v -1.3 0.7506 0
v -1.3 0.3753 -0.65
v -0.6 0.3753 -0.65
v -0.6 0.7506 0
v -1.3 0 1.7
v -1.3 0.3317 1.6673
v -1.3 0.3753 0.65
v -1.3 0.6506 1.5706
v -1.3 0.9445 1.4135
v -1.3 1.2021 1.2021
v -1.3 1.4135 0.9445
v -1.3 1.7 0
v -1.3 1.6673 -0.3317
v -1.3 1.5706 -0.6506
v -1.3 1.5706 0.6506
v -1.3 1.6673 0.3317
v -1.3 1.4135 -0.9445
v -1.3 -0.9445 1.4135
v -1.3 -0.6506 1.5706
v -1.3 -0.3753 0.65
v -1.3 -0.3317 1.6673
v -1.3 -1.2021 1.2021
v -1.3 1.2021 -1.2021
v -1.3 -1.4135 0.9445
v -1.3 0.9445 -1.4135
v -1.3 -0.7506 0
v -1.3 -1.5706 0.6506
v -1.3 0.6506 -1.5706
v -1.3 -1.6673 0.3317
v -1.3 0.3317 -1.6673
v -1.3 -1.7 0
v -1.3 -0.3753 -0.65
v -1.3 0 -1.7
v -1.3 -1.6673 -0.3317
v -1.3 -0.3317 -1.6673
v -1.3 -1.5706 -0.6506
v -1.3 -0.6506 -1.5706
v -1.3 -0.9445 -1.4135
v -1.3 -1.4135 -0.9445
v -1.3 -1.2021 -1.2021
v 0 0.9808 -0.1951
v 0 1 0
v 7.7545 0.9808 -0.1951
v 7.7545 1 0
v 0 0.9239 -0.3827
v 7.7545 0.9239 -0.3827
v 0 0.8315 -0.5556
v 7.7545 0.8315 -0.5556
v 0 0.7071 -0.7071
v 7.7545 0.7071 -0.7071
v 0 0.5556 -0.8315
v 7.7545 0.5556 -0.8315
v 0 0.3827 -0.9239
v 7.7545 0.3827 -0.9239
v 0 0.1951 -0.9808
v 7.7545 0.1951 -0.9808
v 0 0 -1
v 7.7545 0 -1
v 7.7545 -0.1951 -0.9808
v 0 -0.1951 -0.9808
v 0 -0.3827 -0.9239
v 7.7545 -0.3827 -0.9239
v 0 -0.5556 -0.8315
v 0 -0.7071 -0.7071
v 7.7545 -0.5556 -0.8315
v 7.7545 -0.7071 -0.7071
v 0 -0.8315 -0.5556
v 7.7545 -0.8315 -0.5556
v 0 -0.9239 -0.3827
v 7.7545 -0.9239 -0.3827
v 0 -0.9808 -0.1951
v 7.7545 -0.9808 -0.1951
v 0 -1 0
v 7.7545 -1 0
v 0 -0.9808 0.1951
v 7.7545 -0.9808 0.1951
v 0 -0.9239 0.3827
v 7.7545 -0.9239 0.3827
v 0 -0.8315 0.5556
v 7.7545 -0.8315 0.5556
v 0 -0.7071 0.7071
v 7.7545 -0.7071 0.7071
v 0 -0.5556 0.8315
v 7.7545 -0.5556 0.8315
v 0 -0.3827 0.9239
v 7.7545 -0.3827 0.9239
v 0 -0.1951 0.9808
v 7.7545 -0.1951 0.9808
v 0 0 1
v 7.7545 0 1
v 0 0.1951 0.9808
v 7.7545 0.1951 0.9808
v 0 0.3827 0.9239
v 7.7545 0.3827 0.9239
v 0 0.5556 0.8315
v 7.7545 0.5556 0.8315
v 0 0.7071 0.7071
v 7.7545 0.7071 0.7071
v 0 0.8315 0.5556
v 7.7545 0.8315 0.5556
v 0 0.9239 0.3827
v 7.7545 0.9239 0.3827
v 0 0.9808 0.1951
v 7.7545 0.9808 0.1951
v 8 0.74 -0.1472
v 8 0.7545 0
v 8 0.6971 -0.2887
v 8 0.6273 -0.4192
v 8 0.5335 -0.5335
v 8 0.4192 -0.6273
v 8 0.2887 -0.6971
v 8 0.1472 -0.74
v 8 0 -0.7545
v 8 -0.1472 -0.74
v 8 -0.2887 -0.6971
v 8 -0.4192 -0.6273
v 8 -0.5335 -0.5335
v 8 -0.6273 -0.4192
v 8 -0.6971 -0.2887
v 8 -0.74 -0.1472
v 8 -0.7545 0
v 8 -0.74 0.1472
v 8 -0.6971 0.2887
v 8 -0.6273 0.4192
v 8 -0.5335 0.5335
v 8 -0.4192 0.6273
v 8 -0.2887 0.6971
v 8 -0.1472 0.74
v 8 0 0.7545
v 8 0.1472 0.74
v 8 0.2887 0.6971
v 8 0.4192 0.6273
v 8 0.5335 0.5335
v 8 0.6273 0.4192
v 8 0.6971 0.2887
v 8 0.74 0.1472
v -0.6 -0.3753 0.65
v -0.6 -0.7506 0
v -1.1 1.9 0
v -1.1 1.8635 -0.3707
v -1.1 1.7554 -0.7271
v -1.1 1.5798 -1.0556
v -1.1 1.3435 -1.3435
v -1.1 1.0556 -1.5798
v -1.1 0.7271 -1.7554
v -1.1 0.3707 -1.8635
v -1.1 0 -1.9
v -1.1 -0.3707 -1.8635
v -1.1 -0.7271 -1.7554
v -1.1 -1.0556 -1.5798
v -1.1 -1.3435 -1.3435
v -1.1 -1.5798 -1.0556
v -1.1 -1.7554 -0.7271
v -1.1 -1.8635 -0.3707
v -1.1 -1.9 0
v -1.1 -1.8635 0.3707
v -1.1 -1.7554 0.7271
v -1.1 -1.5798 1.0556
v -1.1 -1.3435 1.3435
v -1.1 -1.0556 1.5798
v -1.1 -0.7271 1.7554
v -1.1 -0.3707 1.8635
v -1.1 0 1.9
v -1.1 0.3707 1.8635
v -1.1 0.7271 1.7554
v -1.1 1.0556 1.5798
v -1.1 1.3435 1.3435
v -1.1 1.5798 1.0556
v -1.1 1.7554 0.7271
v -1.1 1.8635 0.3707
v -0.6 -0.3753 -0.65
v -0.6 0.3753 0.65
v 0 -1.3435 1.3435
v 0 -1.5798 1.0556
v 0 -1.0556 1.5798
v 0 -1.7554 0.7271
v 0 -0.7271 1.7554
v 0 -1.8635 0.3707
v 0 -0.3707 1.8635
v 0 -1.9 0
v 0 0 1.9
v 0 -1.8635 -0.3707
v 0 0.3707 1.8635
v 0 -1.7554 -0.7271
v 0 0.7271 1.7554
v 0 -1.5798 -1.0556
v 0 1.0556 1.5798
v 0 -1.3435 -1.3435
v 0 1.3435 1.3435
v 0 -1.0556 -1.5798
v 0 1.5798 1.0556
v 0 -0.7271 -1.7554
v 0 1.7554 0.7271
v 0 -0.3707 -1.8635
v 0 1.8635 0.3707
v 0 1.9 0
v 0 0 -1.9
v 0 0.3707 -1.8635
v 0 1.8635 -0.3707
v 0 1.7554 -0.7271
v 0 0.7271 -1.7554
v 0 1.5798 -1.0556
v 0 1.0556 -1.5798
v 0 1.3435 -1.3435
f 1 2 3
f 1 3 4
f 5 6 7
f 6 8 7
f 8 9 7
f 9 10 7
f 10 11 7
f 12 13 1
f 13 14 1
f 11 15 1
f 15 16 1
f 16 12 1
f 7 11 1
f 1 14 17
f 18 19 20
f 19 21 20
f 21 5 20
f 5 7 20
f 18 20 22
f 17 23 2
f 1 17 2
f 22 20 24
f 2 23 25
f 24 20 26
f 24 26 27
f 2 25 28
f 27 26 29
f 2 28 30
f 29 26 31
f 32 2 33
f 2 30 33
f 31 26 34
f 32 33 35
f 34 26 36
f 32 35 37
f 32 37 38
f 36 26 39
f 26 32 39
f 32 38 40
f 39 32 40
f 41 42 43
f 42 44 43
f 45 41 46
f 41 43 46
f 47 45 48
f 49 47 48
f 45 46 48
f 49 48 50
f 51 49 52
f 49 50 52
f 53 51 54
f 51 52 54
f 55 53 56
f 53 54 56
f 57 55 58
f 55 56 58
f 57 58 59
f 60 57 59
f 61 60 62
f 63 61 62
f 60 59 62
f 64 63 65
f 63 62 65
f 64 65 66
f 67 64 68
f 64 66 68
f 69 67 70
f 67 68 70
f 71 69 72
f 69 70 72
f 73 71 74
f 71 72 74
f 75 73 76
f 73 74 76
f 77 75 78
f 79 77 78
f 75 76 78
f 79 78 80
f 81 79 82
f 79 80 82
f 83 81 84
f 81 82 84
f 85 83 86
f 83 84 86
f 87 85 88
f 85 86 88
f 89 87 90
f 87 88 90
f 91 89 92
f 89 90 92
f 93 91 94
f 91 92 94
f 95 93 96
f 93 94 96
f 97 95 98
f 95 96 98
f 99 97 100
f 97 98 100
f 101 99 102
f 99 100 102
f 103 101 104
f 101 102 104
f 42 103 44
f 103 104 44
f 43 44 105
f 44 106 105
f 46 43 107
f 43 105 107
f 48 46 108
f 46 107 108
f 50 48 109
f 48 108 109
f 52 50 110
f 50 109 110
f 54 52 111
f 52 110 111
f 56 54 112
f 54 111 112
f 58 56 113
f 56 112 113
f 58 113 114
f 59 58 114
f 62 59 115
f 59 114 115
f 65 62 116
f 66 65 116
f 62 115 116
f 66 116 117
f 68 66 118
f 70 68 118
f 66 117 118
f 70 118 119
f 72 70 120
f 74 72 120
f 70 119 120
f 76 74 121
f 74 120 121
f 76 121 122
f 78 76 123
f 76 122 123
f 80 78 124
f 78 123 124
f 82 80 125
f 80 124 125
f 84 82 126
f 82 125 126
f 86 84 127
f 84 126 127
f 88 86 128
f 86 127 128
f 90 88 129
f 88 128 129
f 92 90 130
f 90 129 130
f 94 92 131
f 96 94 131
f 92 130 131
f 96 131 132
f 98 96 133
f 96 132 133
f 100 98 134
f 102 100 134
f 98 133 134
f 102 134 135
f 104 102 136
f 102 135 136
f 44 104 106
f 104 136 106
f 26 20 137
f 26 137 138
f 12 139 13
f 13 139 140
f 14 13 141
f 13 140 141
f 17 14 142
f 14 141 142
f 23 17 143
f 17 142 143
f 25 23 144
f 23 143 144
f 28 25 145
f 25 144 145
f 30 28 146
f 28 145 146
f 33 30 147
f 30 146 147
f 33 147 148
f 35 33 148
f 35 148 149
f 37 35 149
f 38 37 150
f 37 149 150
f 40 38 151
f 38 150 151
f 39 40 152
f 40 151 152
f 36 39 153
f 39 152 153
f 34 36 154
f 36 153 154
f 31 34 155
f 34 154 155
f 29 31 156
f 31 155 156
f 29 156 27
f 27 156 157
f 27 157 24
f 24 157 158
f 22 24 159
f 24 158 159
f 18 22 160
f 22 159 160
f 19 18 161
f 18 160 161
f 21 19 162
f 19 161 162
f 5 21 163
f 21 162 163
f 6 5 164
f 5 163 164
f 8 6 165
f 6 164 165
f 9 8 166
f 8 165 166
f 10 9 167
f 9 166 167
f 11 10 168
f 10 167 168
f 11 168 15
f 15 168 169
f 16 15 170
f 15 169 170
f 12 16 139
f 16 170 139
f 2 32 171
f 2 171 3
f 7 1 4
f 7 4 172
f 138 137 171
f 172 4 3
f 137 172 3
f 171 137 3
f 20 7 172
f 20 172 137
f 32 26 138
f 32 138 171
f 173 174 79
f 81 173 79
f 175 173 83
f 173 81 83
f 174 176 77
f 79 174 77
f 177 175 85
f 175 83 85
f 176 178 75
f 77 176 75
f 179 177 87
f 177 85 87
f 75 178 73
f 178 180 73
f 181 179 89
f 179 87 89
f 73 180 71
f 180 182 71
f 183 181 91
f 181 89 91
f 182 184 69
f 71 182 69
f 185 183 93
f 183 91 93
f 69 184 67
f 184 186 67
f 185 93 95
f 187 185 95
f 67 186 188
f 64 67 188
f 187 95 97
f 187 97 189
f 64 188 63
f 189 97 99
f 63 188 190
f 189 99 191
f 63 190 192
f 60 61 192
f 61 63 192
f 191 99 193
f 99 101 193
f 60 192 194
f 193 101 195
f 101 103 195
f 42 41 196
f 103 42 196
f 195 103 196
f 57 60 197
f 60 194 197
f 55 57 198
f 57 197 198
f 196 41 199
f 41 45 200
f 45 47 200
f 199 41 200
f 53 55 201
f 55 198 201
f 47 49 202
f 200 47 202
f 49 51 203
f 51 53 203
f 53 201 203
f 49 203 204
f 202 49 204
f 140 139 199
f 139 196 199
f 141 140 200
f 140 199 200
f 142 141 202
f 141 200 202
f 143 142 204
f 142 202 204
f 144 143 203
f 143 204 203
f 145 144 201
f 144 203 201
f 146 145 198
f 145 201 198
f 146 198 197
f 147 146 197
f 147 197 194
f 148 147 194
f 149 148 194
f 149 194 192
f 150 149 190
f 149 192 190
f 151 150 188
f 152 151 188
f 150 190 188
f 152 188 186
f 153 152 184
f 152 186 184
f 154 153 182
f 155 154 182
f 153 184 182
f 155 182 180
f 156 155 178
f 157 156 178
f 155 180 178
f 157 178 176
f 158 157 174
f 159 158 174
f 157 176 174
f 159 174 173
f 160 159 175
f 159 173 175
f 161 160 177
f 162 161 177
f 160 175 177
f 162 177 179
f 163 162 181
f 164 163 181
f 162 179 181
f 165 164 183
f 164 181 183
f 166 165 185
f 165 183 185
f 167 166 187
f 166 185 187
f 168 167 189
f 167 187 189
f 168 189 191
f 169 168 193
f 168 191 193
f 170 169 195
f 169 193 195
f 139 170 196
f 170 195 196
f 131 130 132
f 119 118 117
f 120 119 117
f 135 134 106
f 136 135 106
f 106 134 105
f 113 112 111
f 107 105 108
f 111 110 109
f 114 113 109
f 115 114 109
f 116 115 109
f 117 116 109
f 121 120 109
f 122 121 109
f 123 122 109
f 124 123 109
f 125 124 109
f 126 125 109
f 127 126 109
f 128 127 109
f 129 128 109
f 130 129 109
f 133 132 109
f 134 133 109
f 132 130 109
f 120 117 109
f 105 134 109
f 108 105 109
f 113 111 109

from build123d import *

# Parameters (mm, degrees)
CUT_EXTRUDE1_DEPTH = 0.7


with BuildPart() as part:
    # Sketch1 → Revolve1 (revolve)
    with BuildSketch(Plane.XY):
        Polygon((-1.3, 0), (-1.3, 1.7), (-1.1, 1.9), (0, 1.9), (0, 1), (7.7545, 1), (8, 0.7545), (8, 0), align=None)
    revolve(axis=Axis((8, 0, 0), (-1, 0, 0)))

    # Sketch2 → Cut-Extrude1 (cut)
    with BuildSketch(Plane(origin=(-1.3, 0, 0), x_dir=(0, 0, -1), z_dir=(1, 0, 0))):
        Polygon((-0.65, -0.375277675), (0, -0.75055535), (0.65, -0.375277675), (0.65, 0.375277675), (0, 0.75055535), (-0.65, 0.375277675), align=None)
    extrude(amount=CUT_EXTRUDE1_DEPTH, mode=Mode.SUBTRACT)


solid = part.part
